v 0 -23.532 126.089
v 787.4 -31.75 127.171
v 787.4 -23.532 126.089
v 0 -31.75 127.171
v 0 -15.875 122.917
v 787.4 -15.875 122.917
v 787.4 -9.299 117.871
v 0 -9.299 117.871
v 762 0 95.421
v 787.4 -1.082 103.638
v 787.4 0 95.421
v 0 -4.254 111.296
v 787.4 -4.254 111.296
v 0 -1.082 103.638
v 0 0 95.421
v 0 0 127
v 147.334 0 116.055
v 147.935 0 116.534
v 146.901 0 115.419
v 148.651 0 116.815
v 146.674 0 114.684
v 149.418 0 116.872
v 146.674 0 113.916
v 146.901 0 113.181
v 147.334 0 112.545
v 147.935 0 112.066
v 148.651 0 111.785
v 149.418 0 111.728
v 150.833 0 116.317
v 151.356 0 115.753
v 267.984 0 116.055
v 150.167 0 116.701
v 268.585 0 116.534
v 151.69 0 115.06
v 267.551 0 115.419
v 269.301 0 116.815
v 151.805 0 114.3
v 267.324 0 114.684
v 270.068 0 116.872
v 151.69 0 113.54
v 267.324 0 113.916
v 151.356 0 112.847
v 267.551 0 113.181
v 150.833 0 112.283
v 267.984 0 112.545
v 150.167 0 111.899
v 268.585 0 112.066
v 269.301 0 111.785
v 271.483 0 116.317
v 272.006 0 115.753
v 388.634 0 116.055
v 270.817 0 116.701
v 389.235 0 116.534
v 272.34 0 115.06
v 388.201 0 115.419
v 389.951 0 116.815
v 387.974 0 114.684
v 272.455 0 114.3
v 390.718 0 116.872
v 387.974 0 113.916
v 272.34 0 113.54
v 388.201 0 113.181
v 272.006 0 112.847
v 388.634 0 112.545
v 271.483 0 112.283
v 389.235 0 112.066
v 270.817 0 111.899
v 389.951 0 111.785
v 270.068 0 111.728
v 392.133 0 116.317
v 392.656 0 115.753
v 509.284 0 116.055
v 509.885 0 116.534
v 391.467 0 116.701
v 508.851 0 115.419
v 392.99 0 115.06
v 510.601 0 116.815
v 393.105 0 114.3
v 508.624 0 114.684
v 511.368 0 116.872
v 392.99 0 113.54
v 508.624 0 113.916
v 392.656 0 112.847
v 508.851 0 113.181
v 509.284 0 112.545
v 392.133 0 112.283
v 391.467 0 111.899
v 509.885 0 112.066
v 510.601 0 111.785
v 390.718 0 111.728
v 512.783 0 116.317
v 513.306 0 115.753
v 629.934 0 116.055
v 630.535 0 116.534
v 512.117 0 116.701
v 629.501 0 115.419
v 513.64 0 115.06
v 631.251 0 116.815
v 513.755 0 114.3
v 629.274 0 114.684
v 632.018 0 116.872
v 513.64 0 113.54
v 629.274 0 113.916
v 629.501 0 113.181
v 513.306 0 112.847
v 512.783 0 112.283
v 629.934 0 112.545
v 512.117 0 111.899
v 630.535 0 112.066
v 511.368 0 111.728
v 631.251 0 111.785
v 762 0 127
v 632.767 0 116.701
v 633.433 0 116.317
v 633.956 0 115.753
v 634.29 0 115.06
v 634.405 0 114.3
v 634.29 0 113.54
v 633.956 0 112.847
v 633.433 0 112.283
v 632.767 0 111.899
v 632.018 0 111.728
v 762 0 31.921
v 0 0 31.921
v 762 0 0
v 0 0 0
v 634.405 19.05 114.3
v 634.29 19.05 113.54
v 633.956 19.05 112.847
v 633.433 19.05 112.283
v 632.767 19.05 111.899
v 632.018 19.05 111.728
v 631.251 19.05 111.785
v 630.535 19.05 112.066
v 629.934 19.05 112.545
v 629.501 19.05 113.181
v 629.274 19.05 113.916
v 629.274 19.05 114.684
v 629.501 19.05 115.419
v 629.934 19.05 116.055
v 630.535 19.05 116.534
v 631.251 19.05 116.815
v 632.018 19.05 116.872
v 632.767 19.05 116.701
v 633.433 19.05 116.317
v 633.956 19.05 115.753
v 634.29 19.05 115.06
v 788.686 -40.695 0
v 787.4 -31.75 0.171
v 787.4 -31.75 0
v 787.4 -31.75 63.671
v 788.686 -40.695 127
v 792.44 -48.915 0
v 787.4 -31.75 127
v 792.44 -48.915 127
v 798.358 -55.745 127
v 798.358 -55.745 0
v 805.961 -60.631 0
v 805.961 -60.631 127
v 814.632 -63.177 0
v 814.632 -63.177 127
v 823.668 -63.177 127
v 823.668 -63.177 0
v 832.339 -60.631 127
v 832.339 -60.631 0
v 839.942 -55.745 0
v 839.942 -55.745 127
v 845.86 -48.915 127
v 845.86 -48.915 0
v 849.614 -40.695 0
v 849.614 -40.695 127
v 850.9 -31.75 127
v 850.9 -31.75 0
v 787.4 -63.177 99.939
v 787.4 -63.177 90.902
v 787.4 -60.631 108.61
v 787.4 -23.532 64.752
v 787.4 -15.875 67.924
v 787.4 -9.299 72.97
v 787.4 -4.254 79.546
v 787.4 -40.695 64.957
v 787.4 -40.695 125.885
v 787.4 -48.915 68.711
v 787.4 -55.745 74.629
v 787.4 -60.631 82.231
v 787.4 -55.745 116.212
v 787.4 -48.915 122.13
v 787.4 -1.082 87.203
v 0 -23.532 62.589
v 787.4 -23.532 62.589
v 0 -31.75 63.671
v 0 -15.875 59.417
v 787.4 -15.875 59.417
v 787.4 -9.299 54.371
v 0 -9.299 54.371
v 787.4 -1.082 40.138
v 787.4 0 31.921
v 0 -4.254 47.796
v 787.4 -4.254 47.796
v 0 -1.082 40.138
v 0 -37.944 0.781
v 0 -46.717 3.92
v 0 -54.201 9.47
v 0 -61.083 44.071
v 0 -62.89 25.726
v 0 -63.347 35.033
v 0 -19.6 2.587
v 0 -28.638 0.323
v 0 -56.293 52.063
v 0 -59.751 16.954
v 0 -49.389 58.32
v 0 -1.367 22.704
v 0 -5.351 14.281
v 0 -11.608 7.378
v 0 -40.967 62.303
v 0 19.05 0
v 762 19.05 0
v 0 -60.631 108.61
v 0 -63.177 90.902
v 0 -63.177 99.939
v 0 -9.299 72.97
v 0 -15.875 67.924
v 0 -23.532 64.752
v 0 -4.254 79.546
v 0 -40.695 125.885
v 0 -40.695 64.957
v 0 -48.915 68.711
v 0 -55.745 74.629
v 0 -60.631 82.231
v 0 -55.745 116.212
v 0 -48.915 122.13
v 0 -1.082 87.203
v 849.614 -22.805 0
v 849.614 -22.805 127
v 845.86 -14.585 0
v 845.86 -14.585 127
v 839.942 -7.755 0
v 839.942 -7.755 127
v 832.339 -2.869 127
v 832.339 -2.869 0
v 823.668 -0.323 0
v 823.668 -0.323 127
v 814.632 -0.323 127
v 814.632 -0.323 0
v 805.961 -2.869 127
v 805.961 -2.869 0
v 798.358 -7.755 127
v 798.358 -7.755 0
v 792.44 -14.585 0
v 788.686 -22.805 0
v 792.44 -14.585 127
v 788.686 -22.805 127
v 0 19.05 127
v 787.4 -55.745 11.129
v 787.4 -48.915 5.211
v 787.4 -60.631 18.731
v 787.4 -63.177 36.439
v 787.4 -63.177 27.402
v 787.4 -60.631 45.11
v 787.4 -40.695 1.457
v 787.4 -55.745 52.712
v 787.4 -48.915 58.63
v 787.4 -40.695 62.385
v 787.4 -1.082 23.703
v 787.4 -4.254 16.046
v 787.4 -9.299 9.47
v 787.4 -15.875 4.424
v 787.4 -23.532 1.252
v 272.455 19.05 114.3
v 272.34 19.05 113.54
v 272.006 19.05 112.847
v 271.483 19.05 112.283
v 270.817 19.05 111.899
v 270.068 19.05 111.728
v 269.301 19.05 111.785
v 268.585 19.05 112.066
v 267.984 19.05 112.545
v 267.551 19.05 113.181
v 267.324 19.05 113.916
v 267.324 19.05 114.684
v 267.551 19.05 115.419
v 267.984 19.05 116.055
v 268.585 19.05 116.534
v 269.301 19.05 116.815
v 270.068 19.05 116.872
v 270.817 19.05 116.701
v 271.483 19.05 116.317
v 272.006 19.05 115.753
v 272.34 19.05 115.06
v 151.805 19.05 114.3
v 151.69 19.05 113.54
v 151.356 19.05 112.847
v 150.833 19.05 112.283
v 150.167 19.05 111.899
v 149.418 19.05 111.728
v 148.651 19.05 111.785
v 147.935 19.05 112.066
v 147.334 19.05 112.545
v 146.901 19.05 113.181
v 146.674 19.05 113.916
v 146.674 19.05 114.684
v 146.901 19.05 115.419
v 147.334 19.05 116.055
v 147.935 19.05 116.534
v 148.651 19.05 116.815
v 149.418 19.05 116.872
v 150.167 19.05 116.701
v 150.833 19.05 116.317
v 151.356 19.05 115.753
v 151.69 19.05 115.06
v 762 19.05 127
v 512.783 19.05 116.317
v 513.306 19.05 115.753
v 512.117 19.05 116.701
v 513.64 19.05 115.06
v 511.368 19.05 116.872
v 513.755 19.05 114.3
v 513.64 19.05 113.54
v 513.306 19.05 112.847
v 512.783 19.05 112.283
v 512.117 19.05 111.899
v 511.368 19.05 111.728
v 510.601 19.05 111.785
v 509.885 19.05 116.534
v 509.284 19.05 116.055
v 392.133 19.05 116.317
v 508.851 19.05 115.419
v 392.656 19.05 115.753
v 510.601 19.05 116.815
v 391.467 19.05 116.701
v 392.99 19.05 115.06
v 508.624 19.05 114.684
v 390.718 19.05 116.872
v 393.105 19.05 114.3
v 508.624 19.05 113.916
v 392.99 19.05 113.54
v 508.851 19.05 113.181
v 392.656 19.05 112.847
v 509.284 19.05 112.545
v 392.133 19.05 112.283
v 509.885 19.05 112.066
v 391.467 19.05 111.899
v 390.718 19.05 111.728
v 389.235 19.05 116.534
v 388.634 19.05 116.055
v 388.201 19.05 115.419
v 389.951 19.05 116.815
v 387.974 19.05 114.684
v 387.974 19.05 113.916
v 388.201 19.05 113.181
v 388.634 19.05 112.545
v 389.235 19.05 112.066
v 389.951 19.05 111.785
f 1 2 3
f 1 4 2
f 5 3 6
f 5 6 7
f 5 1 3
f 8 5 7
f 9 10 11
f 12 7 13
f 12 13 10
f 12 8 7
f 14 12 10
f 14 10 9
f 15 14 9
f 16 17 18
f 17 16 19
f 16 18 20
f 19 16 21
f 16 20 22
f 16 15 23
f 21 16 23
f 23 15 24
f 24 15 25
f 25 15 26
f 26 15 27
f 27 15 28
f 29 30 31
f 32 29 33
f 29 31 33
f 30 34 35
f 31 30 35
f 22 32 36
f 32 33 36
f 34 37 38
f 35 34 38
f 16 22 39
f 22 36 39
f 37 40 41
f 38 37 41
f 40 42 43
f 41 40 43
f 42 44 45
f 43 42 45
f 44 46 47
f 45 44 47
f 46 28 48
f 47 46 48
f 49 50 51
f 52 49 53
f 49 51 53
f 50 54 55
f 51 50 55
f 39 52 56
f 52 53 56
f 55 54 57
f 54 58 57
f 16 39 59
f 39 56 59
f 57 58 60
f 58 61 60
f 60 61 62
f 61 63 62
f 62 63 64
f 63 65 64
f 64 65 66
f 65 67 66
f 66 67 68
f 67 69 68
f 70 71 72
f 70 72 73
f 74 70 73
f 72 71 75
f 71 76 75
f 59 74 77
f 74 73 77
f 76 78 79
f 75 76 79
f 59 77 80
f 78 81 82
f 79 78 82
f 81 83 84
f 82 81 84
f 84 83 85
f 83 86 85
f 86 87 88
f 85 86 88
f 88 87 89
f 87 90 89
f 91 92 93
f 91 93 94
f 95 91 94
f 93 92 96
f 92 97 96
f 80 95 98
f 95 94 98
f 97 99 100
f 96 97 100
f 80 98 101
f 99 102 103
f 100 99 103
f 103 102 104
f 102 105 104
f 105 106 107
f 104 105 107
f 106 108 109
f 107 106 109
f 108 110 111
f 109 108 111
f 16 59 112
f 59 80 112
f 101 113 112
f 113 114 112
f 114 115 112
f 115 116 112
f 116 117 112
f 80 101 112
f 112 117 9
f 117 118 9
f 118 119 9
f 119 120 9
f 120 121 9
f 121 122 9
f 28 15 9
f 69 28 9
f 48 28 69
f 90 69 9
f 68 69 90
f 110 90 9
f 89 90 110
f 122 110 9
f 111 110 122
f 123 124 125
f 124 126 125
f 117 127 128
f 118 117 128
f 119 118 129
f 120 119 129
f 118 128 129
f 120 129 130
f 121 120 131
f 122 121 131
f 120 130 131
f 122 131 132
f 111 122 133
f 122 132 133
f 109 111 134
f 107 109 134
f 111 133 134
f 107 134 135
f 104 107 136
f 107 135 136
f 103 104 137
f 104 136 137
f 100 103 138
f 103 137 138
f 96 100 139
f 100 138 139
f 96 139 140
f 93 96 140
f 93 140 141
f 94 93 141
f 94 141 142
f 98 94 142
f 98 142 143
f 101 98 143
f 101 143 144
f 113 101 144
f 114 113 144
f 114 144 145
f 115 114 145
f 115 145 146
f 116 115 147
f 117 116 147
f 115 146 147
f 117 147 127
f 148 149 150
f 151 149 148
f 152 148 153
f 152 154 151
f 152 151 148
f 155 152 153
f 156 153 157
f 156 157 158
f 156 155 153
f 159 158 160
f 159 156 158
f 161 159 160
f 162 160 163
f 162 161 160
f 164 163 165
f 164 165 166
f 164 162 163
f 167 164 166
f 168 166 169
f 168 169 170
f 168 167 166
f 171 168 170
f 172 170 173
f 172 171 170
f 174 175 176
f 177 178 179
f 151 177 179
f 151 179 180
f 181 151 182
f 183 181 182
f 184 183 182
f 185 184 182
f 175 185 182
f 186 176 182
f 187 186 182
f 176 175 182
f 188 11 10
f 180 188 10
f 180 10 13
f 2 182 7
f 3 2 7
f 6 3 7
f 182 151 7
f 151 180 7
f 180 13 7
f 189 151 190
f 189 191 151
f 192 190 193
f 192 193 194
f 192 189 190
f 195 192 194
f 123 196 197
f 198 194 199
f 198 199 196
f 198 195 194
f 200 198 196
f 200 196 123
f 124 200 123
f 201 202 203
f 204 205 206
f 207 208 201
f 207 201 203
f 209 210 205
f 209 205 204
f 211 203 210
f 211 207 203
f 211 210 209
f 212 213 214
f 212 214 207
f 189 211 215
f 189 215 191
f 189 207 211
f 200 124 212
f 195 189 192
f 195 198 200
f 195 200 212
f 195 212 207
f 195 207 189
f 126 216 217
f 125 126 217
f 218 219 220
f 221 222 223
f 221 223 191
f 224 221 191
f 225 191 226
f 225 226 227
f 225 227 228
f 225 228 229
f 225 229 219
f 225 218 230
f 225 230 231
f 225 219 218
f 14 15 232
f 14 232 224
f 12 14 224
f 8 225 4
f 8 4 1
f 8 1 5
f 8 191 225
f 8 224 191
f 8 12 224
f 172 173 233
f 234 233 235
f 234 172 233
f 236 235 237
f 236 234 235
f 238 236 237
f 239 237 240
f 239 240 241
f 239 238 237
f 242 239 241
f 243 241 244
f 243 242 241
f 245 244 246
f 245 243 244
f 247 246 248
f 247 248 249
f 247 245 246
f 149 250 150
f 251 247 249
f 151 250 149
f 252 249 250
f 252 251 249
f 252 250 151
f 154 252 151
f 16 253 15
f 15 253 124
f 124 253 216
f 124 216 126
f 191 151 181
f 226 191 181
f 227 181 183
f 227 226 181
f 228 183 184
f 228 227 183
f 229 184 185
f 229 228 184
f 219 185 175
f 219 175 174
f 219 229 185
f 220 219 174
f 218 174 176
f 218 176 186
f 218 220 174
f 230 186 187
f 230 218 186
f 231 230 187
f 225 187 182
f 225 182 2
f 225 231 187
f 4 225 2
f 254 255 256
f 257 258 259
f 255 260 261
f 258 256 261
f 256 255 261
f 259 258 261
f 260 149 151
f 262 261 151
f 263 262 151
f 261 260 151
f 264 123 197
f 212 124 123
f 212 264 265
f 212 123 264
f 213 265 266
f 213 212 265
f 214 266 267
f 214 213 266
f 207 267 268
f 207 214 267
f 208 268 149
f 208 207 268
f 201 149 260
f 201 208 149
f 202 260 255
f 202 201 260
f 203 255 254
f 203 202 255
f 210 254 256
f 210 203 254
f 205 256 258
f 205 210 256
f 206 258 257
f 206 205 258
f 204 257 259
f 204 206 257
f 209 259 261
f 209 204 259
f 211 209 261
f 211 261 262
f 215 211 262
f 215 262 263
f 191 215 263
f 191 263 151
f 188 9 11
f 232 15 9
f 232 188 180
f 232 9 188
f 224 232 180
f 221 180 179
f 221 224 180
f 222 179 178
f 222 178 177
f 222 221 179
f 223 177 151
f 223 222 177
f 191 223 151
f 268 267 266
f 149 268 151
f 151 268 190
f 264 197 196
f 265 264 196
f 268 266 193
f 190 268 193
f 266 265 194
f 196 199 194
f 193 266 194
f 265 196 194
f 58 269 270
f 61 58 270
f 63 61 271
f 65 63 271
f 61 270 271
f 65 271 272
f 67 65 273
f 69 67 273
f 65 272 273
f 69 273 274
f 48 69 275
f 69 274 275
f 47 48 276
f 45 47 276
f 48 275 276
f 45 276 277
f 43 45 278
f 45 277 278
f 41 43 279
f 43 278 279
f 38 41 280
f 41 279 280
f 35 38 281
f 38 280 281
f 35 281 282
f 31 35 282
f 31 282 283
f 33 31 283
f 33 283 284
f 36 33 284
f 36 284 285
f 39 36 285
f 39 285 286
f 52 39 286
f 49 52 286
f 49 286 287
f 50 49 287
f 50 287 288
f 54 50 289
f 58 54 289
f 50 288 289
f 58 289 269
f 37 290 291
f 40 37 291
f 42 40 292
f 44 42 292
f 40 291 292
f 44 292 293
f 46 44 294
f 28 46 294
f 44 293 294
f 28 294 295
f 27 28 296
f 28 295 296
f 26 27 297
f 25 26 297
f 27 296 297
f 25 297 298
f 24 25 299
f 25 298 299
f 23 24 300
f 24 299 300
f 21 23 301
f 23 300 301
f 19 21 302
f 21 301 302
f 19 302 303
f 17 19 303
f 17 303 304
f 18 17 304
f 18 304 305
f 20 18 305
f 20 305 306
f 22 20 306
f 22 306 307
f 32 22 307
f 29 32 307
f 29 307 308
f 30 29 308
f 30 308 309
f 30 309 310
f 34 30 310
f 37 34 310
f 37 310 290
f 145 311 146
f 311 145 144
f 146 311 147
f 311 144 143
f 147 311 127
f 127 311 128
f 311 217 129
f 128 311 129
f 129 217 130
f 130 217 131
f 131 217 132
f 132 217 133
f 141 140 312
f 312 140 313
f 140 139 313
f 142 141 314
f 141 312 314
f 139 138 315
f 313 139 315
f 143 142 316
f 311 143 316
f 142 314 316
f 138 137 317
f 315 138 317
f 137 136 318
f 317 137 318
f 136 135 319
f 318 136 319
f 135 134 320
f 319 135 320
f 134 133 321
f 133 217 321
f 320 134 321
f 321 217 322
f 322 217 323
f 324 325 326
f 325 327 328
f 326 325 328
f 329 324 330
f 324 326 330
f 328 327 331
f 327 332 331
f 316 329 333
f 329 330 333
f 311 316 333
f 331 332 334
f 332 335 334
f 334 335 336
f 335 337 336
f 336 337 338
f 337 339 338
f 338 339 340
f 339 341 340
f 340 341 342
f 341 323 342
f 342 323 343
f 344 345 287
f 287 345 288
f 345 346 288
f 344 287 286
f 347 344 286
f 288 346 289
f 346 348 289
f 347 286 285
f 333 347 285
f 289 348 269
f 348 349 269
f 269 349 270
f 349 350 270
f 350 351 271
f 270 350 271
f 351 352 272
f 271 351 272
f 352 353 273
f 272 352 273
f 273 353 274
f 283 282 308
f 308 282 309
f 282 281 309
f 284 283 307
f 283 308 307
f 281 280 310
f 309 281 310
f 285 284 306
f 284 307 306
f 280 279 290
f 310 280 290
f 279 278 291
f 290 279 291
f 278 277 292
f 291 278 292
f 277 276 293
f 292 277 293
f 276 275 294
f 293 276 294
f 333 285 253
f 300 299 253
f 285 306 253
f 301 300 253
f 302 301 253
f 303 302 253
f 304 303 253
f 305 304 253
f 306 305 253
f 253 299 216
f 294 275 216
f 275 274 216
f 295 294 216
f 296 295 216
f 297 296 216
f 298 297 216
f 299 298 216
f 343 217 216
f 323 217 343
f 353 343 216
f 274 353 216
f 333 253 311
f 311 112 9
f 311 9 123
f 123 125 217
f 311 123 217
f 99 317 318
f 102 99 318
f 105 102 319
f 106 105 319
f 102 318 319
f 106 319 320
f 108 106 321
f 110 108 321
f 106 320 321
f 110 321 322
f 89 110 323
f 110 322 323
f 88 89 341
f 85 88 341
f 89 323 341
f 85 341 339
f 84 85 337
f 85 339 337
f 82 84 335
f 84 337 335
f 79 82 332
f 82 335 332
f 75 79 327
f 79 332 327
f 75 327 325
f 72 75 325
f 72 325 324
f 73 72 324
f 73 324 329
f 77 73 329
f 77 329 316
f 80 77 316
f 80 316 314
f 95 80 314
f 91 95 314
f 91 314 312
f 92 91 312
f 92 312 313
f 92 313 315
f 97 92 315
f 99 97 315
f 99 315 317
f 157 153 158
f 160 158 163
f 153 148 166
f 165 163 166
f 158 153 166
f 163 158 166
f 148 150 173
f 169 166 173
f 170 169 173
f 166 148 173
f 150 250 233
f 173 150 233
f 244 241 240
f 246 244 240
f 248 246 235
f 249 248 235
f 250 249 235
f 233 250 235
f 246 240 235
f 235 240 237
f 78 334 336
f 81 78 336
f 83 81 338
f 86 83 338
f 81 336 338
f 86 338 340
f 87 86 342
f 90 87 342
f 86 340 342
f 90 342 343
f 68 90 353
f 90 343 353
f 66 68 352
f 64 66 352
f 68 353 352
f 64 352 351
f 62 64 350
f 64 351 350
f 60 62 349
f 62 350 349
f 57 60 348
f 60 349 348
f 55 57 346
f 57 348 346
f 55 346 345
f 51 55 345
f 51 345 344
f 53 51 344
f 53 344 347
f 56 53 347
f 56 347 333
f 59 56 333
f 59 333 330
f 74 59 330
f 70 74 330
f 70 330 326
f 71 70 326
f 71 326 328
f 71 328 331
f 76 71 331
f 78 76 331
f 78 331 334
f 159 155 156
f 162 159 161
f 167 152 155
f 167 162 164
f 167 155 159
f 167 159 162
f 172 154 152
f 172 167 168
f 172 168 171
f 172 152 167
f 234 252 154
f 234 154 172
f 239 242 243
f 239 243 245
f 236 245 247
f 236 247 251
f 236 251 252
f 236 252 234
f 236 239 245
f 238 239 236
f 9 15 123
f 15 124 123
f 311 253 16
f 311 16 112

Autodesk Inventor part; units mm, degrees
ref_plane "YZ Plane" through (0, 0, 0) normal (1, 0, 0) x (0, 1, 0)
ref_plane "XZ Plane" through (0, 0, 0) normal (0, 1, 0) x (-1, 0, 0)
ref_plane "XY Plane" through (0, 0, 0) normal (0, 0, 1) x (1, 0, 0)
sketch "Sketch1" plane through (0, 0, 0) normal (0, 0, 1) x (1, 0, 0)
  line L0 (0, 0) -> (762, 0)
  line L1 (762, 0) -> (762, 19.05)
  line L2 (762, 19.05) -> (0, 19.05)
  line L3 (0, 19.05) -> (0, 0)
  dimension "d0" = 762
  dimension "d1" = 19.05
extrude "Extrusion1" add sketch "Sketch1" along normal blind 127
sketch "Sketch2" plane through (0, 0, 0) normal (-1, 0, 0) x (0, 0, 1)
  line L0 (127.1706, 0) -> (127.1706, -31.75) construction
  line L1 (127.1706, -31.75) -> (95.4206, -31.75) construction
  line L2 (95.4206, -31.75) -> (31.9206, -31.75) construction
  circle A0 centre (31.9206, -31.75) radius 31.75
  line L3 (0, 0) -> (127, 0) projected
  circle A1 centre (95.4206, -31.75) radius 31.75
  dimension "d4" = 31.75
  dimension "d5" = 31.75
  dimension "d6" = 63.5
extrude "Extrusion2" add sketch "Sketch2" against normal blind 787.4 contours A0 | A1
sketch "Sketch4" plane through (0, 0, 127) normal (0, 0, 1) x (1, 0, 0)
  line L0 (0, -31.75) -> (787.4, -31.75) projected
  line L1 (787.4, -31.75) -> (819.15, -31.75) construction
  circle A0 centre (819.15, -31.75) radius 31.75
  point P0 (0, 0)
  dimension "d13" = 31.75
extrude "Extrusion4" add sketch "Sketch4" against normal blind 127
sketch "Sketch5" plane through (0, 19.05, 0) normal (0, 1, 0) x (1, 0, 0)
  line L0 (0, -127) -> (0, -114.3)
  line L1 (0, 0) -> (0, -127) projected
  line L2 (762, -31.9206) -> (762, -95.4206) construction
  line L3 (0, -114.3) -> (149.225, -114.3) construction
  circle A0 centre (149.225, -114.3) radius 2.5797
  line L4 (149.225, -114.3) -> (269.875, -114.3) construction
  line L5 (269.875, -114.3) -> (390.525, -114.3) construction
  line L6 (390.525, -114.3) -> (511.175, -114.3) construction
  line L7 (511.175, -114.3) -> (631.825, -114.3) construction
  circle A1 centre (269.875, -114.3) radius 2.5797
  circle A2 centre (390.525, -114.3) radius 2.5797
  circle A3 centre (511.175, -114.3) radius 2.5797
  circle A4 centre (631.825, -114.3) radius 2.5797
  dimension "d16" = 12.7
  dimension "d17" = 149.225
  dimension "d30" = 5.1594
  dimension "d33" = 120.65
  dimension "d34" = 120.65
  dimension "d35" = 120.65
  dimension "d36" = 120.65
extrude "Extrusion6" cut sketch "Sketch5" against normal blind 19.05
properties part number "Bumper Side"
